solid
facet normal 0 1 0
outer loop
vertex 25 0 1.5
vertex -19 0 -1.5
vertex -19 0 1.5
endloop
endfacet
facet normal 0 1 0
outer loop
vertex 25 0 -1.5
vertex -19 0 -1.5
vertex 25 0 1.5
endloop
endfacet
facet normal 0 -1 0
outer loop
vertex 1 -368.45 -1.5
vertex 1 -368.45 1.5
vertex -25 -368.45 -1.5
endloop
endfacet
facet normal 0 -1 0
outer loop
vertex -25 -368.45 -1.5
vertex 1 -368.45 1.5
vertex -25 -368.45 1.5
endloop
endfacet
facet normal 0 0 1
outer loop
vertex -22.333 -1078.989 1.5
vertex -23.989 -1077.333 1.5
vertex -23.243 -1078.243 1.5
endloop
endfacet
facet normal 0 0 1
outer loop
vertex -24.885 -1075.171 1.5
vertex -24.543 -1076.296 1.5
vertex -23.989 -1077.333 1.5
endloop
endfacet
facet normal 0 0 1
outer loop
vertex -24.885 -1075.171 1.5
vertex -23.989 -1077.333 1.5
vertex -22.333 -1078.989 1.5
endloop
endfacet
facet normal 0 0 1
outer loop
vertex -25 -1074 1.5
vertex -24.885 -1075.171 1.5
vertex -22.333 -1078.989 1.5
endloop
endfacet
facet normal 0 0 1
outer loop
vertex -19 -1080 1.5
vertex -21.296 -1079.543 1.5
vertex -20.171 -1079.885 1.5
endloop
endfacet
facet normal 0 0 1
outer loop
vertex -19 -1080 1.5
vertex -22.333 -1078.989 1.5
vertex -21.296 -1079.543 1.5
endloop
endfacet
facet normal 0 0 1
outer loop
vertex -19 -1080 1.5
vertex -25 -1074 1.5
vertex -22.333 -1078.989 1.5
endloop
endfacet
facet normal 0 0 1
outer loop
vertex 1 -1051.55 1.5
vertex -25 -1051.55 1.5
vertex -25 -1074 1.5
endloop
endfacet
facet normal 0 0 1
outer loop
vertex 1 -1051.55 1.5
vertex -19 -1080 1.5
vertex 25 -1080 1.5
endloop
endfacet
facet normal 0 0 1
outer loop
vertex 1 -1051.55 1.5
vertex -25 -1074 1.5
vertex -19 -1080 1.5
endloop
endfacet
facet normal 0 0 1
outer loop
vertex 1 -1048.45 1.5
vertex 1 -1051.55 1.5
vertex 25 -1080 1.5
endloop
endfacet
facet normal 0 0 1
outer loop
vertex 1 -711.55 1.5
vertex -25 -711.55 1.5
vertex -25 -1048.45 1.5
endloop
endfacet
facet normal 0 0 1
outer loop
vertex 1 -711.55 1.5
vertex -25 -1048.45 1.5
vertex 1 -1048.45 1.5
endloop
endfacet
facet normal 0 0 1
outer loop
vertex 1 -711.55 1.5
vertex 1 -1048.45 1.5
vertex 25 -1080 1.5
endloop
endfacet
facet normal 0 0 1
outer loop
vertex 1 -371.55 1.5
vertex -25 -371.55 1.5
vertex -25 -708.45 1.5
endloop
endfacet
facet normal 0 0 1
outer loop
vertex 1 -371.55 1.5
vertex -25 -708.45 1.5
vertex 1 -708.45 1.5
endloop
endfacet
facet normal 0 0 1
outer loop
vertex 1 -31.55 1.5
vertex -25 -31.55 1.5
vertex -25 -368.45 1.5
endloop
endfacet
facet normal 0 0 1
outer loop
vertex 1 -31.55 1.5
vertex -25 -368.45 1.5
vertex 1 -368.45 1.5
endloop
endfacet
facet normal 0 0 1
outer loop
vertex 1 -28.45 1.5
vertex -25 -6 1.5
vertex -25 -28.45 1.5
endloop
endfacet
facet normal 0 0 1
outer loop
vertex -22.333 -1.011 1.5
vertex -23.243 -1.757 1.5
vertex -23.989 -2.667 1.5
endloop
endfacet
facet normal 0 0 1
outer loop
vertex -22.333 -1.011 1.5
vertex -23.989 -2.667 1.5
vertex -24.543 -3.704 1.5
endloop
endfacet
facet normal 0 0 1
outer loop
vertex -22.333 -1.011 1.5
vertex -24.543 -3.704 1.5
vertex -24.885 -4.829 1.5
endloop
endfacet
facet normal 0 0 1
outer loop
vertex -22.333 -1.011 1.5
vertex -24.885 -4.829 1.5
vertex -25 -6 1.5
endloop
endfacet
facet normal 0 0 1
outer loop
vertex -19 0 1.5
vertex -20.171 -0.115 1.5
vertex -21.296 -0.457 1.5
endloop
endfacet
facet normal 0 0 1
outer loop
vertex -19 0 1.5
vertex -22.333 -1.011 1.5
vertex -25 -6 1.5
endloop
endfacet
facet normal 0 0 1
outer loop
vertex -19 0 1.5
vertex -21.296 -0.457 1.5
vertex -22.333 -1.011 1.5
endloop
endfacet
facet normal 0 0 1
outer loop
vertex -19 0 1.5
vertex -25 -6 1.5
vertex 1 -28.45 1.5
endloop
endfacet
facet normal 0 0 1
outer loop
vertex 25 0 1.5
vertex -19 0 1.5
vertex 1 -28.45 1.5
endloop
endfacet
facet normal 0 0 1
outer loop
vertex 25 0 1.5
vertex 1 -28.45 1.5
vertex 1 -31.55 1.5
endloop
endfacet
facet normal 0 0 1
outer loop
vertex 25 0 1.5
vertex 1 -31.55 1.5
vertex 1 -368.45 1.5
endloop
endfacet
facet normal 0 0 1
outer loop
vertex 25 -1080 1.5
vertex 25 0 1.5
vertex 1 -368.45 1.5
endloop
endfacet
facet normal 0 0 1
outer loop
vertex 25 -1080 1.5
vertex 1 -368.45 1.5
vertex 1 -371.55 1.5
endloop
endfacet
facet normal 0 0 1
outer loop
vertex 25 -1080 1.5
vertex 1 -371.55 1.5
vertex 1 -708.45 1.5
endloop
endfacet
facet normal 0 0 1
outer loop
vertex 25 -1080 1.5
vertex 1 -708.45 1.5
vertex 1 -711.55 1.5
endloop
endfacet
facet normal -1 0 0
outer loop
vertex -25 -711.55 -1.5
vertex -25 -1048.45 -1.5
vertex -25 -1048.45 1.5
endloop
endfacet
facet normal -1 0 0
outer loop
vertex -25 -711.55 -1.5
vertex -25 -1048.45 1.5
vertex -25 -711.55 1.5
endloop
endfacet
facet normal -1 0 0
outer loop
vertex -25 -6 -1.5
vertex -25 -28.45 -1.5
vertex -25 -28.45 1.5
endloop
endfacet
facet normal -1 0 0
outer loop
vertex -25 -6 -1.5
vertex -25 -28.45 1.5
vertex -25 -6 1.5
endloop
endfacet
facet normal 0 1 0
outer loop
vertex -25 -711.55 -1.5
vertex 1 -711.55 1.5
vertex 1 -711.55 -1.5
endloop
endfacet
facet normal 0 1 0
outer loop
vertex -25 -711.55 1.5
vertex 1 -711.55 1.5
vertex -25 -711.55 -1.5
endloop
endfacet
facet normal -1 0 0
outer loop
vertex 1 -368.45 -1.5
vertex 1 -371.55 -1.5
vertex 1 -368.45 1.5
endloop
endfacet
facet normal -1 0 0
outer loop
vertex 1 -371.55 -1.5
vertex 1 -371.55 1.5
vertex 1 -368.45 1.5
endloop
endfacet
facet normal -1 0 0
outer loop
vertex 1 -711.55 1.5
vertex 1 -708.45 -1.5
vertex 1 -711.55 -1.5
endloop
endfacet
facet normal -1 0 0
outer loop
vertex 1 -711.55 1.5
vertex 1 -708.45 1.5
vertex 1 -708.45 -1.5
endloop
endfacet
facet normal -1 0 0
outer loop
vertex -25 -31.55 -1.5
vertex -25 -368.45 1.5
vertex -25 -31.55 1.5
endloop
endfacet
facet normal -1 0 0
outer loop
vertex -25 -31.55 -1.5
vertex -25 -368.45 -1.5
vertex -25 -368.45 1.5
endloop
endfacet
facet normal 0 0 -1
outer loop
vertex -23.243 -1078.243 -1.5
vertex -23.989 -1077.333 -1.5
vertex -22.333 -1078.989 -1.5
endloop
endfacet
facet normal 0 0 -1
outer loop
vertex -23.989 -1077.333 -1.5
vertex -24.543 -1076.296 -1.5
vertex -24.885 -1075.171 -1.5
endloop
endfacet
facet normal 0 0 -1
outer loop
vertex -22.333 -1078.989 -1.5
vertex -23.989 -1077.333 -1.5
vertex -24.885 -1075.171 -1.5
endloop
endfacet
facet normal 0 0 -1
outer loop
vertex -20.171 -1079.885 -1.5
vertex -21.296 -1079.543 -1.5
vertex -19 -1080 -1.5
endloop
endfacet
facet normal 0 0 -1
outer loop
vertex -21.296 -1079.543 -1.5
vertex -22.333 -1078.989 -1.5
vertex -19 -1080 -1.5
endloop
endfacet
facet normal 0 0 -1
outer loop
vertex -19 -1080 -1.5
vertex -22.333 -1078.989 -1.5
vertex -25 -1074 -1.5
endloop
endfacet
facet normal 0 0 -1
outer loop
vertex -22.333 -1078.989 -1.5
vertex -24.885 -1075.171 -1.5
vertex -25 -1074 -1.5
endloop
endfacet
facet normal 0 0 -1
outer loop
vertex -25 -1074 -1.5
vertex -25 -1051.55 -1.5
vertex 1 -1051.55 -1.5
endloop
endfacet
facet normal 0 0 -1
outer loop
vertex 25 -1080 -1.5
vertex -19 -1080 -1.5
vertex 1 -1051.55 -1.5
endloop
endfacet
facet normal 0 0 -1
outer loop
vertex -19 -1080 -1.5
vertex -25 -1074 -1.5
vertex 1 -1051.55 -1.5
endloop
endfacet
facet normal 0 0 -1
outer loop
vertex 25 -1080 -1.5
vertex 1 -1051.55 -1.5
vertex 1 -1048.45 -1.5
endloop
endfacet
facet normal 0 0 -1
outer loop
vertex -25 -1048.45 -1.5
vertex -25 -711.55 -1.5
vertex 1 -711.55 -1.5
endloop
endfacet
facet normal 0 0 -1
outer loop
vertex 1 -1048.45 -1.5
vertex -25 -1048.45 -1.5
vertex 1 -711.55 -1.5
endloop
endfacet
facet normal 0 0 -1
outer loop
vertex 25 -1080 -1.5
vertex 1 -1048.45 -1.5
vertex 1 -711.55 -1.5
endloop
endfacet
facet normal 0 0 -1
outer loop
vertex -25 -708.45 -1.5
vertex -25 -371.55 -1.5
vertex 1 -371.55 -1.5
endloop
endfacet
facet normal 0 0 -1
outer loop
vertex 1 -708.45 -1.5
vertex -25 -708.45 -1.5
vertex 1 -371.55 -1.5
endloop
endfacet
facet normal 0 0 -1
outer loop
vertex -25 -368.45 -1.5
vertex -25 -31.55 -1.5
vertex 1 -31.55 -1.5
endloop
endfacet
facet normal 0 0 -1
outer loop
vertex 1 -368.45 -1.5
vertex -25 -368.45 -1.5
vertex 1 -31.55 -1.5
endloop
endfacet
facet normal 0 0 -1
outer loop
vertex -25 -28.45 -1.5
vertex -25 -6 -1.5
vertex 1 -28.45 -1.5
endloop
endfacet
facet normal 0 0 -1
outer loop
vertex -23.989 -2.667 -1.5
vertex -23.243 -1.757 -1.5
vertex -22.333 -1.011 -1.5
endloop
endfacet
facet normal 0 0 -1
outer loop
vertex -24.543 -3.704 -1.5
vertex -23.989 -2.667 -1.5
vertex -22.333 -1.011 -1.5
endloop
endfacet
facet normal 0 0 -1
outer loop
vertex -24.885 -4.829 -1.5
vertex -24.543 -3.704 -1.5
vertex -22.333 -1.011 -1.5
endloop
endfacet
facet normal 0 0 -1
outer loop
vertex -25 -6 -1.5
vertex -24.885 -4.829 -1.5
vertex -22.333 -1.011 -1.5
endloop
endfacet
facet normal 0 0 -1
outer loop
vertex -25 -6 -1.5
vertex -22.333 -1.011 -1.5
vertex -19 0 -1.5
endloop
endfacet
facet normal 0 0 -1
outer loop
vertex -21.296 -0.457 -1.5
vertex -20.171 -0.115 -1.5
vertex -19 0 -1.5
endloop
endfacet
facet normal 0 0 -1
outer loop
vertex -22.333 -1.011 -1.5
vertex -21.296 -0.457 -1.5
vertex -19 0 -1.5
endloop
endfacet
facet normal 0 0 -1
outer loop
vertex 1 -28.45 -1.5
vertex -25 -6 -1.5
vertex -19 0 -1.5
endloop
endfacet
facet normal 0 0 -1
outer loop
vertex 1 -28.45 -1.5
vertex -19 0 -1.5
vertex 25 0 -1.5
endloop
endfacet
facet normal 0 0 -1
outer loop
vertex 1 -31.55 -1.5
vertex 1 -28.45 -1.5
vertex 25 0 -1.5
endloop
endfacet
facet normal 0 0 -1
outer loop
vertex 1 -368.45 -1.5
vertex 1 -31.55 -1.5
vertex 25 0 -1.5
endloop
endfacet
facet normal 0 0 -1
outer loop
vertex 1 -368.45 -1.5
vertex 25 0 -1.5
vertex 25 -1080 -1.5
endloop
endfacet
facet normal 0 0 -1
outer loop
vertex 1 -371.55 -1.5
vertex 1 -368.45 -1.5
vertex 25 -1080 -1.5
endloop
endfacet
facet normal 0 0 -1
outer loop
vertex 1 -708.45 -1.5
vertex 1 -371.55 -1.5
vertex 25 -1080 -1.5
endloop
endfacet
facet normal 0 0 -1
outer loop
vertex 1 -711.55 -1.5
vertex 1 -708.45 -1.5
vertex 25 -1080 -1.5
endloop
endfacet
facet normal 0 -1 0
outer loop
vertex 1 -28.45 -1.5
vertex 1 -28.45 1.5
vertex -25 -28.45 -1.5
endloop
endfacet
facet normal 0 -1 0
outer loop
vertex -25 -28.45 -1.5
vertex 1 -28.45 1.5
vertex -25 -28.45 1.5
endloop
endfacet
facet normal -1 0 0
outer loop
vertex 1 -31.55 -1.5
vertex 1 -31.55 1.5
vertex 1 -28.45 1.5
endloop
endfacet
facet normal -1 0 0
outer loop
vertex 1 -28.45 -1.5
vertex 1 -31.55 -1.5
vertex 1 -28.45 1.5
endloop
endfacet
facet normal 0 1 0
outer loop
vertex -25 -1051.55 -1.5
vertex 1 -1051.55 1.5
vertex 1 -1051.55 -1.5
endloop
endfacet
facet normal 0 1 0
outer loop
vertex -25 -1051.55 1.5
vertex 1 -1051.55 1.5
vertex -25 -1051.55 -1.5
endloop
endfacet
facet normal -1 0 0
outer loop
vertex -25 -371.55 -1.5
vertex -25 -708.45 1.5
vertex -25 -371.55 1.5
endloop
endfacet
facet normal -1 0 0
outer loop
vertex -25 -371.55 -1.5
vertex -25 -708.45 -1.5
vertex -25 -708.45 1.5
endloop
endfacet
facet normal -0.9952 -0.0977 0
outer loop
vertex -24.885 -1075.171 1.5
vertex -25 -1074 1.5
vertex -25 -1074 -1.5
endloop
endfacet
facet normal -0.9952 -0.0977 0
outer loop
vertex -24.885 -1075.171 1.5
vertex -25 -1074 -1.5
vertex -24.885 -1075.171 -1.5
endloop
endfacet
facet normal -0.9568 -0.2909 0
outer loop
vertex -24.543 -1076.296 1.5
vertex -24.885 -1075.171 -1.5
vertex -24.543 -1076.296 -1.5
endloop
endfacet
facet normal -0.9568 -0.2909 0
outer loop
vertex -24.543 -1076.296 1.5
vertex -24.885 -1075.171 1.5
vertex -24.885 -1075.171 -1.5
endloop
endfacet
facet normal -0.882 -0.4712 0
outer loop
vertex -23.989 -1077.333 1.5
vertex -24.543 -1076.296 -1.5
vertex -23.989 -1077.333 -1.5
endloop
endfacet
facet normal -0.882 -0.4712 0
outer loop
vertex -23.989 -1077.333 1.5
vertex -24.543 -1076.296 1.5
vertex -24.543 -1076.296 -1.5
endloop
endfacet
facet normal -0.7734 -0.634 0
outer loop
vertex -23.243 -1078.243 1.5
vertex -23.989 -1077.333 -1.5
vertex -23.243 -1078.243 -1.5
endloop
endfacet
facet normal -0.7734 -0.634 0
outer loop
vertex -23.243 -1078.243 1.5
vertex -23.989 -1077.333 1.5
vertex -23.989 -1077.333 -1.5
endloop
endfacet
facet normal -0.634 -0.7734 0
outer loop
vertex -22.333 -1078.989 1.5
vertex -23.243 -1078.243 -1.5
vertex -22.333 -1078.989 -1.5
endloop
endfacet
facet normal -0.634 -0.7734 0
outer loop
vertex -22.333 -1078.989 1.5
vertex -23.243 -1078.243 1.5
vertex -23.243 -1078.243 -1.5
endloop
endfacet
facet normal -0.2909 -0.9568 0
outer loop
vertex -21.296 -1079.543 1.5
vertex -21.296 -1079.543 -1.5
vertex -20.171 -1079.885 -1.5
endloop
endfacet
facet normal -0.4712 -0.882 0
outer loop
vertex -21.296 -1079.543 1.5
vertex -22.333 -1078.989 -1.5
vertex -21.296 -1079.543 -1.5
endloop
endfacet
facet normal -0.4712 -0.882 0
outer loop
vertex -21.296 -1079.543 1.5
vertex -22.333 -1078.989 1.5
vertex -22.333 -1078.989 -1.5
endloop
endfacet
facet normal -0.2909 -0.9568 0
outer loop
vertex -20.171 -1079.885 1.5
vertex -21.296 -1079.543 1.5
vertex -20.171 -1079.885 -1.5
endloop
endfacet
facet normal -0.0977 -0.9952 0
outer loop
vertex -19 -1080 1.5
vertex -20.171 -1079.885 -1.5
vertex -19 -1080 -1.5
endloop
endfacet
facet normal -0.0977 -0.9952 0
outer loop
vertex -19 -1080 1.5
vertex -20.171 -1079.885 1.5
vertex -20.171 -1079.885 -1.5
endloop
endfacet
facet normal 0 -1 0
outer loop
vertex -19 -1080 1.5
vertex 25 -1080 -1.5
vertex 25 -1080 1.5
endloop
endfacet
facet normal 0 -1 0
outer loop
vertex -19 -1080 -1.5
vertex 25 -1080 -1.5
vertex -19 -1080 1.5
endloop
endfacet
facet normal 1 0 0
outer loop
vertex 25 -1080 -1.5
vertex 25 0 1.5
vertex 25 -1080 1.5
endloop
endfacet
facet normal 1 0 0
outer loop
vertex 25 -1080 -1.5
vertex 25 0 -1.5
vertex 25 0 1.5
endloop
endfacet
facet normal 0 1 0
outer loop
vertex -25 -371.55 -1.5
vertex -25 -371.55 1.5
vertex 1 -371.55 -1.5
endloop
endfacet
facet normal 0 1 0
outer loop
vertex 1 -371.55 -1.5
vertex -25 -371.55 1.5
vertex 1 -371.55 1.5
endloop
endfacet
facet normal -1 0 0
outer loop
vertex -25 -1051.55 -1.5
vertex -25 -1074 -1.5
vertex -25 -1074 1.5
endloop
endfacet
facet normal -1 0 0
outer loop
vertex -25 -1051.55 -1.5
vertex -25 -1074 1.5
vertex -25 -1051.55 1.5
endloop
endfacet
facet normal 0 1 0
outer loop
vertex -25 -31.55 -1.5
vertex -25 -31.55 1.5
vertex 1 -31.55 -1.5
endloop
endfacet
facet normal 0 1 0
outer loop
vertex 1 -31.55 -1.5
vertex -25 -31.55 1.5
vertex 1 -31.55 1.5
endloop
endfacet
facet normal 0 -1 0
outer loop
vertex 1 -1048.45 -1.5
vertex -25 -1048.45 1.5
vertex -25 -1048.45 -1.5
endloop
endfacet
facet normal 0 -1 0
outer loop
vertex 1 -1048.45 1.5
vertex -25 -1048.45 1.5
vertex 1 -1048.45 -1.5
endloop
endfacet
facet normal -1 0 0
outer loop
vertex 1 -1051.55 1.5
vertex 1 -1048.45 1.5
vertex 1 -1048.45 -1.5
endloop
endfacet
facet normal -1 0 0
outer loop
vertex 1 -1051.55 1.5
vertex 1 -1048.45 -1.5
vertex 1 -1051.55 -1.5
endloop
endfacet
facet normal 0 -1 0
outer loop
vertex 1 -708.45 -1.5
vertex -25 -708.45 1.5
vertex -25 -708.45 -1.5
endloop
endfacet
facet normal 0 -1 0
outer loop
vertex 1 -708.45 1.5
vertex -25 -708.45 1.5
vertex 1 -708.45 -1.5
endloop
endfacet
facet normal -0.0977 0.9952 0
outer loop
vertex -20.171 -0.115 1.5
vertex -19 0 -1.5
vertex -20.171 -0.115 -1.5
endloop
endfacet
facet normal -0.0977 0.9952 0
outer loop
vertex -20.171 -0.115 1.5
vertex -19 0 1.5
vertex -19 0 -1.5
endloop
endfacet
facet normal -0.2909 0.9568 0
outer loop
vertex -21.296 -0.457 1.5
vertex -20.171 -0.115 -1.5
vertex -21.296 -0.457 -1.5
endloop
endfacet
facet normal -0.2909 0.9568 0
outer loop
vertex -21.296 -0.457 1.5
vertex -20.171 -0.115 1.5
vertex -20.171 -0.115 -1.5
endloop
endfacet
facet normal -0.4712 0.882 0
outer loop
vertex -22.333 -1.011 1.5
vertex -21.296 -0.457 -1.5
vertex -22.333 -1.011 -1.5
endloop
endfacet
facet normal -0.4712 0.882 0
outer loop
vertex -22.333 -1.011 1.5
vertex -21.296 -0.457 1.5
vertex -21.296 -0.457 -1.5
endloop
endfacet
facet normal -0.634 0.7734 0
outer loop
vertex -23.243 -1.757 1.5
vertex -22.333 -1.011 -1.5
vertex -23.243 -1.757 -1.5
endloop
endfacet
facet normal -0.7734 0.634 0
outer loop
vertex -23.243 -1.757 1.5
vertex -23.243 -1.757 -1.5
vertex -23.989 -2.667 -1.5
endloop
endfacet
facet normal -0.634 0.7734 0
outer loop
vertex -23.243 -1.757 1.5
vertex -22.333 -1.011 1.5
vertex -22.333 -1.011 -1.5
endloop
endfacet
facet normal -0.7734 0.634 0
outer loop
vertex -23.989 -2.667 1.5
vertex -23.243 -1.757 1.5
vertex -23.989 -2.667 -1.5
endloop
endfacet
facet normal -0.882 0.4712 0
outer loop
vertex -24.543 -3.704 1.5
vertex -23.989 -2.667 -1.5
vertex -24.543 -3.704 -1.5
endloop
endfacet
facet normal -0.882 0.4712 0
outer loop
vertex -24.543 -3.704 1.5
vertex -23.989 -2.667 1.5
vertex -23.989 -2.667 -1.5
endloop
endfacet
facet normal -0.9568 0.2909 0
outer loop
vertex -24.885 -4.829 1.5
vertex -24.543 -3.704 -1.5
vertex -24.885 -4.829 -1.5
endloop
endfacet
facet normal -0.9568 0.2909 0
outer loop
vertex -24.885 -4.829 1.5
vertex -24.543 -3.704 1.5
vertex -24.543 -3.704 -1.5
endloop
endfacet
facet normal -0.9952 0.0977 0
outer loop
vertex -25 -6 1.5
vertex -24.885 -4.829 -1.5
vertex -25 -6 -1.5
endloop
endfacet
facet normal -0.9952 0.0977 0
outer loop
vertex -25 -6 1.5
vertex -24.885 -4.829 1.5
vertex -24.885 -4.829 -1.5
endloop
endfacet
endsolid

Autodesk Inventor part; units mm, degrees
ref_plane "YZ Plane" through (0, 0, 0) normal (1, 0, 0) x (0, 1, 0)
ref_plane "XZ Plane" through (0, 0, 0) normal (0, 1, 0) x (-1, 0, 0)
ref_plane "XY Plane" through (0, 0, 0) normal (0, 0, 1) x (1, 0, 0)
sketch "Sketch1" plane through (0, 0, 0) normal (0, 0, 1) x (1, 0, 0)
  line L0 (-25, 0) -> (25, 0)
  line L1 (25, 0) -> (25, -1080)
  line L2 (25, -1080) -> (-25, -1080)
  line L3 (-25, -1080) -> (-25, 0)
  point P0 (0, 0)
  point P1 (0, 0)
  point P2 (-25, -1153.2713)
  dimension "d0" = 50
  dimension "d1" = 1080
extrude "Plate1" add sketch "Sketch1" along normal mid plane 3
sketch "Sketch2" plane through (0, 0, 1.5) normal (0, 0, 1) x (1, 0, 0)
  line L0 (-25, -708.45) -> (1, -708.45)
  line L1 (1, -708.45) -> (1, -711.55)
  line L2 (1, -711.55) -> (-25, -711.55)
  line L3 (-25, -711.55) -> (-25, -708.45)
  line L4 (-25, -1080) -> (-25, 0) projected
  line L5 (-25, -371.55) -> (1, -371.55)
  line L6 (1, -371.55) -> (1, -368.45)
  line L7 (1, -368.45) -> (-25, -368.45)
  line L8 (-25, -368.45) -> (-25, -371.55)
  line L9 (-25, -1048.45) -> (1, -1048.45)
  line L10 (1, -1048.45) -> (1, -1051.55)
  line L11 (1, -1051.55) -> (-25, -1051.55)
  line L12 (-25, -1051.55) -> (-25, -1048.45)
  line L13 (-25, -31.55) -> (1, -31.55)
  line L14 (1, -31.55) -> (1, -28.45)
  line L15 (1, -28.45) -> (-25, -28.45)
  line L16 (-25, -28.45) -> (-25, -31.55)
  line L17 (-25, -540) -> (1, -540) construction
  point P0 (0, 0)
  point P1 (-25, -710)
  point P2 (-25, -370)
  point P3 (-25, -371.55)
  point P4 (-25, -1050)
  point P5 (-25, -30)
  point P6 (-25, -28.45)
  point P7 (-25, -31.55)
  point P8 (-25, -1048.45)
  point P9 (-25, -1051.55)
  dimension "d16" = 3.1
  dimension "d17" = 26
  dimension "d25" = 340
  dimension "d29" = 340
  dimension "d31" = 340
extrude "Extrusion1" cut sketch "Sketch2" against normal through all
fillet "Corner Round3" radius 6 2 edges at (-25, -1080, 0) (-25, 0, 0)
sketch "Sketch3" plane through (0, 0, -1.5) normal (0, 0, -1) x (-1, 0, 0)
  line L0 (5.4391, -935.4771) -> (-3.5887, -935.4771) construction
  line L1 (-3.5887, -935.4771) -> (-3.5887, -826.531) construction
  line L2 (-3.5887, -826.531) -> (5.4391, -826.531) construction
  line L3 (5.4391, -826.531) -> (5.4391, -935.4771) construction
  point P0 (0, 0)
  dimension "d2" = 3
  dimension "GapSize" = 3
  dimension "SeamGap" = 0.01
  dimension "Thickness" = 3
  dimension "BendRadius" = 5
  dimension "MinimumRemnant" = 6
  dimension "BendReliefDepth" = 1.5
  dimension "BendReliefWidth" = 3
  dimension "CornerReliefSize" = 12
  dimension "JacobiRadiusSize" = 5
  dimension "TransitionRadius" = 5
mark "Mark1"
equation "\"d2\" = Thickness"
equation "\"d25\" = d31"
equation "\"d29\" = d31"
equation "\"GapSize\" = Thickness"
equation "\"MinimumRemnant\" = 2 * Thickness"
equation "\"BendReliefDepth\" = 0.5 * Thickness"
equation "\"BendReliefWidth\" = Thickness"
equation "\"CornerReliefSize\" = 4 * Thickness"
equation "\"JacobiRadiusSize\" = BendRadius"
equation "\"TransitionRadius\" = BendRadius"
properties part number "MSC 605 RIB CONE EXIT BACK" material "Stainless Steel"
